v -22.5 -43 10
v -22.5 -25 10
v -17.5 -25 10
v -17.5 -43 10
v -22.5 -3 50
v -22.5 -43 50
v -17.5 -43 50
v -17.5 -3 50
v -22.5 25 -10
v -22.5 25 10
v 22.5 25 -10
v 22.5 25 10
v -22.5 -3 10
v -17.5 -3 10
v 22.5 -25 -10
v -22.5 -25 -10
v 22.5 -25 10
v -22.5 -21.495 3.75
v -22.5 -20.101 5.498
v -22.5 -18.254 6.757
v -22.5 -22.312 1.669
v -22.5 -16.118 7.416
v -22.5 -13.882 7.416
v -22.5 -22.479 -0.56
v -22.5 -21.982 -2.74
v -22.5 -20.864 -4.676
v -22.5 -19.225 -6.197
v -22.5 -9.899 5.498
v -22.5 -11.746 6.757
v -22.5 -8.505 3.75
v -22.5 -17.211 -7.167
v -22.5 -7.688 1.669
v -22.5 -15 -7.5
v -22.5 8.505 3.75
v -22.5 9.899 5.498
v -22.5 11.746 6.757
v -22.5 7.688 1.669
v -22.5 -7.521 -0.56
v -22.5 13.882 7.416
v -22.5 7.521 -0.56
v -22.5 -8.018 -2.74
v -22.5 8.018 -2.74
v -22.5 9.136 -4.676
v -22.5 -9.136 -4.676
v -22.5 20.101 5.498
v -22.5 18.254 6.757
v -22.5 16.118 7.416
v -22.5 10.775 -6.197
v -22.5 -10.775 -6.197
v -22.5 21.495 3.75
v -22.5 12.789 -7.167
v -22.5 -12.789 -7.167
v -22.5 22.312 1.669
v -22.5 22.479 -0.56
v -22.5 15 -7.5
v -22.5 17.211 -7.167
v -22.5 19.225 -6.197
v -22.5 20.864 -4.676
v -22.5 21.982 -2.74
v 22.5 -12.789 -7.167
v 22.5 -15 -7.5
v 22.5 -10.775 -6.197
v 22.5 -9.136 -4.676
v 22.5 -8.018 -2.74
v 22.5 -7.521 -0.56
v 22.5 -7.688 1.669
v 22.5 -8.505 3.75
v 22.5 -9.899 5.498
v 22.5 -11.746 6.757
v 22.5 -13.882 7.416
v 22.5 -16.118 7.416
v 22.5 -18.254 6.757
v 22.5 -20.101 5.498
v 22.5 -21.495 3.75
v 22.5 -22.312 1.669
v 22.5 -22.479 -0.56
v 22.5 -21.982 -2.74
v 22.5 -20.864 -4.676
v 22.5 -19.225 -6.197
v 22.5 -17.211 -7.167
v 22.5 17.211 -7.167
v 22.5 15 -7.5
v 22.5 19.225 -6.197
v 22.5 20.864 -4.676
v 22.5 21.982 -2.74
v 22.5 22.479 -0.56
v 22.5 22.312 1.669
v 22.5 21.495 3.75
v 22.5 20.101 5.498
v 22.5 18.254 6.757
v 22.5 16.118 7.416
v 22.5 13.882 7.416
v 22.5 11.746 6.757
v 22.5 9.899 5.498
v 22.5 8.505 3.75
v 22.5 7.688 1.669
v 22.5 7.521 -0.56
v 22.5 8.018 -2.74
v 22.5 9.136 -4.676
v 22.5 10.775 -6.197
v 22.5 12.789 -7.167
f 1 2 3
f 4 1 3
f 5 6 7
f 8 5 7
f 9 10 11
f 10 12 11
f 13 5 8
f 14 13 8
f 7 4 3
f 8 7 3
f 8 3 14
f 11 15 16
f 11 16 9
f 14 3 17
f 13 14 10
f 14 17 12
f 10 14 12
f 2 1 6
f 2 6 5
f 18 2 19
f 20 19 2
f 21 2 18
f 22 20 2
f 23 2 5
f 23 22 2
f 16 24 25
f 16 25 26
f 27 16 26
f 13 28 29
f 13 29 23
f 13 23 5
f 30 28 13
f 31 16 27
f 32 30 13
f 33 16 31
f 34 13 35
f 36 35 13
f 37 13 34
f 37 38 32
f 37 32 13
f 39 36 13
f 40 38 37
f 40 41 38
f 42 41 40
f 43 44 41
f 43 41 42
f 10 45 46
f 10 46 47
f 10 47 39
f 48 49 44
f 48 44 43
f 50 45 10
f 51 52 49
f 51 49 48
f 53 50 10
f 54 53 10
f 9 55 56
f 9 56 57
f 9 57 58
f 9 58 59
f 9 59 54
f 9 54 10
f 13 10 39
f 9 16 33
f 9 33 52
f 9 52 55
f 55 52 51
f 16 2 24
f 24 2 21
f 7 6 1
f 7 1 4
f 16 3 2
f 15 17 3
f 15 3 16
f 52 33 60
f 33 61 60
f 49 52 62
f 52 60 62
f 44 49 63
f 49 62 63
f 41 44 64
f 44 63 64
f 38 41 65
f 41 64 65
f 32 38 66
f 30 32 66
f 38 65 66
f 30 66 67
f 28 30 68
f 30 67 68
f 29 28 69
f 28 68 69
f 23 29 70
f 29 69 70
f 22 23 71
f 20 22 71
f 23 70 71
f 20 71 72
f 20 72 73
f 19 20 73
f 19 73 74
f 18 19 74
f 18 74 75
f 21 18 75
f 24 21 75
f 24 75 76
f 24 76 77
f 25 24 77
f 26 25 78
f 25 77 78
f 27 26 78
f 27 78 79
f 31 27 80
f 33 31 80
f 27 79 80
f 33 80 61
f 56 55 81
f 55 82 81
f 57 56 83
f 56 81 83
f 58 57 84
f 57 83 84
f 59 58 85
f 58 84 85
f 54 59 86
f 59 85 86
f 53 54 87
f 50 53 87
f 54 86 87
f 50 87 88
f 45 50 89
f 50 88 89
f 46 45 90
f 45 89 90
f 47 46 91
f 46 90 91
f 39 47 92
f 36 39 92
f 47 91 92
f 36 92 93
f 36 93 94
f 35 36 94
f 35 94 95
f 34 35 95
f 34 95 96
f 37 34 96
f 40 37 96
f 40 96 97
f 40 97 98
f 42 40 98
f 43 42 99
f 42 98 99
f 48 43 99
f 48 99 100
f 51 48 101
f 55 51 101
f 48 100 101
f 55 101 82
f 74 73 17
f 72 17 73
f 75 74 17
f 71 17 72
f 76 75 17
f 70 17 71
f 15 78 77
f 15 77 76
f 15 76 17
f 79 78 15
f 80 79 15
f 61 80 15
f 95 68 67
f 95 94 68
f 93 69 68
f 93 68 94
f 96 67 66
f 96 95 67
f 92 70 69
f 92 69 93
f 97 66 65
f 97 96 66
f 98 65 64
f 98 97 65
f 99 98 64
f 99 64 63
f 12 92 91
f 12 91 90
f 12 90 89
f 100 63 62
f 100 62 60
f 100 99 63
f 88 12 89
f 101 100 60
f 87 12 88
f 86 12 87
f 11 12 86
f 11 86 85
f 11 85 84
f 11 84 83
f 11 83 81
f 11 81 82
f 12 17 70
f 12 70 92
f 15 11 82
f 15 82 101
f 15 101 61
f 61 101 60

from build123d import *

# Parameters (mm, degrees)
SKETCH2_W               = 20
SKETCH2_H               = 50
BOSS_EXTRUDE1_DEPTH     = 22.5
SKETCH3_W               = 5
SKETCH3_H               = 40
BOSS_EXTRUDE2_DEPTH     = 40
SKETCH4_R               = 7.5
CUT_EXTRUDE1_DEPTH      = 23.5
CUT_EXTRUDE1_DEPTH_BACK = 23.5


with BuildPart() as part:
    # Sketch2 → Boss-Extrude1 (new body, symmetric)
    with BuildSketch(Plane(origin=(0, 0, 0), x_dir=(0, 0, -1), z_dir=(1, 0, 0))):
        Rectangle(SKETCH2_W, SKETCH2_H)
    extrude(amount=BOSS_EXTRUDE1_DEPTH, both=True)

    # Sketch3 → Boss-Extrude2 (add)
    with BuildSketch(Plane.XY.offset(10)):
        with Locations((-20, -23)):
            Rectangle(SKETCH3_W, SKETCH3_H)
    extrude(amount=BOSS_EXTRUDE2_DEPTH)

    # Sketch4 → Cut-Extrude1 (cut, two sides)
    with BuildSketch(Plane(origin=(0, 0, 0), x_dir=(0, 0, -1), z_dir=(1, 0, 0))) as cut_extrude1_sk:
        with Locations((0, -15)):
            Circle(SKETCH4_R)
        with Locations((0, 15)):
            Circle(SKETCH4_R)
    extrude(amount=CUT_EXTRUDE1_DEPTH, mode=Mode.SUBTRACT)
    extrude(cut_extrude1_sk.sketch, amount=-CUT_EXTRUDE1_DEPTH_BACK, mode=Mode.SUBTRACT)


solid = part.part
